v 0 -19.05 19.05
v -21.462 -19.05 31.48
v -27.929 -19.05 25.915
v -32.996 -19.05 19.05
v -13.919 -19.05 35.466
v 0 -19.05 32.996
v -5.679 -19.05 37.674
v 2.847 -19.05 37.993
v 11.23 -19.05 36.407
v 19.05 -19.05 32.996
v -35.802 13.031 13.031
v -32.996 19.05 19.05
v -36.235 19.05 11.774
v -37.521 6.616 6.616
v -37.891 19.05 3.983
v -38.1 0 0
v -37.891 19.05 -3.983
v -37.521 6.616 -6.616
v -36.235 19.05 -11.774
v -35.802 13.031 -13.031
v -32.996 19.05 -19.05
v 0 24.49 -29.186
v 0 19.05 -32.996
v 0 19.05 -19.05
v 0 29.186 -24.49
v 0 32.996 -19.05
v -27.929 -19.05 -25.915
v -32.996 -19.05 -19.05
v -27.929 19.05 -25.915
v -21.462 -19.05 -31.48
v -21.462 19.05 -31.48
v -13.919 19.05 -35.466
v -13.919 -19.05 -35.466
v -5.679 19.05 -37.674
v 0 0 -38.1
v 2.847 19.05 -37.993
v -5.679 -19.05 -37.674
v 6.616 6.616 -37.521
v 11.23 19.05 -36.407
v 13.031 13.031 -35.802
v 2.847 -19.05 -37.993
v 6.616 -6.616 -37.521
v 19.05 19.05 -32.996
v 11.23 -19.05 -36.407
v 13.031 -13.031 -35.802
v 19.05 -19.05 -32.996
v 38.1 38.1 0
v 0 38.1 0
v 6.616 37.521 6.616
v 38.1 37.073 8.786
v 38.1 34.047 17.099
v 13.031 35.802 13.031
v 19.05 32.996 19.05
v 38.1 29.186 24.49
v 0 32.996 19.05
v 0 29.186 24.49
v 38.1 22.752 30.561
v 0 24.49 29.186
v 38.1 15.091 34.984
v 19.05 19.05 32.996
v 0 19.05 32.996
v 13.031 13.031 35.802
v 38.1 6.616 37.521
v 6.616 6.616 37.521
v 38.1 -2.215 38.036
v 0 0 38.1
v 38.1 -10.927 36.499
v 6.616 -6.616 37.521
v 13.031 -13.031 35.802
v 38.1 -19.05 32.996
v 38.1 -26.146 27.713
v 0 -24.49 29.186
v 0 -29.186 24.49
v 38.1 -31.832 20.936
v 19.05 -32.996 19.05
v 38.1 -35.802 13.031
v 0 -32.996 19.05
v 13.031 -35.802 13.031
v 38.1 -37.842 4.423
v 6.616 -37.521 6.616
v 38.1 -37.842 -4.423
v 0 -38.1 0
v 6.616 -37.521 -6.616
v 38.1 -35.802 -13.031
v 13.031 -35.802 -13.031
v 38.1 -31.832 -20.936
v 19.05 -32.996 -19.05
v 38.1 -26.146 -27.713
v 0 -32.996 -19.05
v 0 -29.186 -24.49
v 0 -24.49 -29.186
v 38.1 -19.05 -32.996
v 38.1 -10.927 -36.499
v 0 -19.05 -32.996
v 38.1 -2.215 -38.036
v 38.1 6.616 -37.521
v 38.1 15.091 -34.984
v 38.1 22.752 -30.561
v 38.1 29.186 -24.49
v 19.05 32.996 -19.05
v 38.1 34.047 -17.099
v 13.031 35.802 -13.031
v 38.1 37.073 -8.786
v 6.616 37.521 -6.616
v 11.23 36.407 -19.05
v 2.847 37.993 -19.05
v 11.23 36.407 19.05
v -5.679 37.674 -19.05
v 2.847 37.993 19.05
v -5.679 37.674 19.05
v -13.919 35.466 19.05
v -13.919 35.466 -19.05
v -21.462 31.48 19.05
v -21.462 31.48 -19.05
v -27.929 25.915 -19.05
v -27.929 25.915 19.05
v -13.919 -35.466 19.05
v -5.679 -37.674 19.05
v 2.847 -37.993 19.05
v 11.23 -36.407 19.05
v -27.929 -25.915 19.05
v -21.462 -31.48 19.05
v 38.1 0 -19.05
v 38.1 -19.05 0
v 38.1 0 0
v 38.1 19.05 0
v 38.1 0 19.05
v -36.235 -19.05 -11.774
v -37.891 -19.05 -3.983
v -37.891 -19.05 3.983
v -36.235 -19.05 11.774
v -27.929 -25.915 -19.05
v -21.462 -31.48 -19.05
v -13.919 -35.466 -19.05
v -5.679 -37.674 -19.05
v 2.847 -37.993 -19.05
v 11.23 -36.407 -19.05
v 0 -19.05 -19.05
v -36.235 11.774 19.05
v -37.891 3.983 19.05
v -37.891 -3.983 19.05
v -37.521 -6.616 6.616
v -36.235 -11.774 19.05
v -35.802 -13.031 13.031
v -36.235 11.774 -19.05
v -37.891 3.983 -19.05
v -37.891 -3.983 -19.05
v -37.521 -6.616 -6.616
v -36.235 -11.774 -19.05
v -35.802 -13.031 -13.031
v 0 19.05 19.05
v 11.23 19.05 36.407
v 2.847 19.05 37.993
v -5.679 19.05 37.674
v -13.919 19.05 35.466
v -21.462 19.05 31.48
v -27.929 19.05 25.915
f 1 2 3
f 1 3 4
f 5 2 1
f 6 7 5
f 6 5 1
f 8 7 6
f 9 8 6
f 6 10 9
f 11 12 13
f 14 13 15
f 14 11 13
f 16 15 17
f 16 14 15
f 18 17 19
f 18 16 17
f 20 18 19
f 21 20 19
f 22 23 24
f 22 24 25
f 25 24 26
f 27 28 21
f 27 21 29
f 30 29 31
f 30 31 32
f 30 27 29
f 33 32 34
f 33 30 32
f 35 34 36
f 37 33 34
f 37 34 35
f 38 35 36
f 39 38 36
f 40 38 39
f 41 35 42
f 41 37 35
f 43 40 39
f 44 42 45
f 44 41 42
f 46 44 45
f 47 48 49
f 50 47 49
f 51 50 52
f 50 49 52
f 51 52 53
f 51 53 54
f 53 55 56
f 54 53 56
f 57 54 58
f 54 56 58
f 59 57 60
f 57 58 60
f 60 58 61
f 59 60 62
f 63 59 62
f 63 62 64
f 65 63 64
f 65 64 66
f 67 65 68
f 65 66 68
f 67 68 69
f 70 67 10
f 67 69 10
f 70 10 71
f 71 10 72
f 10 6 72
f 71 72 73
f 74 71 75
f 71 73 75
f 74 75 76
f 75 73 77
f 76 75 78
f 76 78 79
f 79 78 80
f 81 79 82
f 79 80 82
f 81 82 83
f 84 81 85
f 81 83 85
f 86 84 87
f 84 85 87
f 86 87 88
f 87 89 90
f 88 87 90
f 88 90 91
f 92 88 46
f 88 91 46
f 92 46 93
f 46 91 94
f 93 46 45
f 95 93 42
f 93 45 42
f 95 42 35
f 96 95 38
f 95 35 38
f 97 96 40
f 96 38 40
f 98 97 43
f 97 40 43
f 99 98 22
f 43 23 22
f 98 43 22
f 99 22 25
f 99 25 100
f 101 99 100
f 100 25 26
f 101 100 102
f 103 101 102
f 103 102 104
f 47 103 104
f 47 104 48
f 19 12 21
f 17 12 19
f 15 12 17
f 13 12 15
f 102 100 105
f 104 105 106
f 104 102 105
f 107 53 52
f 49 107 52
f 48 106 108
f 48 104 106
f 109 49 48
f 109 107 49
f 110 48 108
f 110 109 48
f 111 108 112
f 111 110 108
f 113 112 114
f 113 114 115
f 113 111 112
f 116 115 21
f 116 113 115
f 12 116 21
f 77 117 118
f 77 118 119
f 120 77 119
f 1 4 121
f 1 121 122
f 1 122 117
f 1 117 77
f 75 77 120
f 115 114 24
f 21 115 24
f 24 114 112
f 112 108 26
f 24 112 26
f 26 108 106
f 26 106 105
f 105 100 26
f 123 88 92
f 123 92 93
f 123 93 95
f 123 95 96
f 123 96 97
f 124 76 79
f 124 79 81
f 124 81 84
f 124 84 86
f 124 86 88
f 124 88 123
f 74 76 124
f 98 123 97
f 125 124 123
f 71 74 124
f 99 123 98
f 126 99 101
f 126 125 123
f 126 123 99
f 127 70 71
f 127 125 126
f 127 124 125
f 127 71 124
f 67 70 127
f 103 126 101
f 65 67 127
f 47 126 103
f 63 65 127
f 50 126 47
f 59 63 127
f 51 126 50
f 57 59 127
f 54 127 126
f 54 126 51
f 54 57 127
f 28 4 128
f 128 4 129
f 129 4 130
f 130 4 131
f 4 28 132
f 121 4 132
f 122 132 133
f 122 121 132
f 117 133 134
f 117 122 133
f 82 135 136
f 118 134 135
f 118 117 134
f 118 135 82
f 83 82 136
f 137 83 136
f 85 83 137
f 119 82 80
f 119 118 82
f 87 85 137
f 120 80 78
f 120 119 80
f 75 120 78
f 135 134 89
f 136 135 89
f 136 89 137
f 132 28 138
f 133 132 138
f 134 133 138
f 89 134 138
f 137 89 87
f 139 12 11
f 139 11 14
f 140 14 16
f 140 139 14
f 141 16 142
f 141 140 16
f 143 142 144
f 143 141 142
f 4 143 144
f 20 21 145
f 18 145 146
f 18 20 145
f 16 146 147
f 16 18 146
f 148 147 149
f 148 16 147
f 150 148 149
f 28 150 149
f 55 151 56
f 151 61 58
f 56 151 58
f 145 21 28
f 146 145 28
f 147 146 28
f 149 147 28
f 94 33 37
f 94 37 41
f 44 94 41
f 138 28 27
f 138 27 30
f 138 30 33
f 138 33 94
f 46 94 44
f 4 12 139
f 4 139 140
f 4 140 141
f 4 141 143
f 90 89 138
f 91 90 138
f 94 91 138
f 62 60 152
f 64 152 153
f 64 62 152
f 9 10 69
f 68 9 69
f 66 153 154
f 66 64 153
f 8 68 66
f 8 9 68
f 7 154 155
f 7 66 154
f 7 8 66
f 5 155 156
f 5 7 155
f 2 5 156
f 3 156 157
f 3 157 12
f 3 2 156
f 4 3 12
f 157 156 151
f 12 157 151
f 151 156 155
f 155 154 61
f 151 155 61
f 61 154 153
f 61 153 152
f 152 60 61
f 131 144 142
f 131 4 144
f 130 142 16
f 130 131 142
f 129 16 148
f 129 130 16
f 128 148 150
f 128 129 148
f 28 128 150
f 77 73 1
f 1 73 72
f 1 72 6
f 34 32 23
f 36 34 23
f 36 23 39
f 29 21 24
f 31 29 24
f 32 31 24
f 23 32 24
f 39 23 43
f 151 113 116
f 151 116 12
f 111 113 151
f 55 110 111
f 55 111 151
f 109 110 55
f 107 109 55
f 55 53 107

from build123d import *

# Parameters (mm, degrees)
F1_R     = 38.1
F3_DEPTH = 19.05
F0_R     = 38.1
F4_DEPTH = 19.05
F2_R     = 38.1
F5_DEPTH = 38.1


with BuildPart() as f3:
    # F1 (on Top) → F3 (new body, symmetric)
    with BuildSketch(Plane.XY):
        Circle(F1_R)
    extrude(amount=F3_DEPTH, both=True)

    # F0 (on Front) → F4 (join, symmetric)
    with BuildSketch(Plane.XZ):
        Circle(F0_R)
    extrude(amount=F4_DEPTH, both=True)

    # F2 (on Right) → F5 (join)
    with BuildSketch(Plane.YZ):
        Circle(F2_R)
    extrude(amount=F5_DEPTH)


solid = f3.part
